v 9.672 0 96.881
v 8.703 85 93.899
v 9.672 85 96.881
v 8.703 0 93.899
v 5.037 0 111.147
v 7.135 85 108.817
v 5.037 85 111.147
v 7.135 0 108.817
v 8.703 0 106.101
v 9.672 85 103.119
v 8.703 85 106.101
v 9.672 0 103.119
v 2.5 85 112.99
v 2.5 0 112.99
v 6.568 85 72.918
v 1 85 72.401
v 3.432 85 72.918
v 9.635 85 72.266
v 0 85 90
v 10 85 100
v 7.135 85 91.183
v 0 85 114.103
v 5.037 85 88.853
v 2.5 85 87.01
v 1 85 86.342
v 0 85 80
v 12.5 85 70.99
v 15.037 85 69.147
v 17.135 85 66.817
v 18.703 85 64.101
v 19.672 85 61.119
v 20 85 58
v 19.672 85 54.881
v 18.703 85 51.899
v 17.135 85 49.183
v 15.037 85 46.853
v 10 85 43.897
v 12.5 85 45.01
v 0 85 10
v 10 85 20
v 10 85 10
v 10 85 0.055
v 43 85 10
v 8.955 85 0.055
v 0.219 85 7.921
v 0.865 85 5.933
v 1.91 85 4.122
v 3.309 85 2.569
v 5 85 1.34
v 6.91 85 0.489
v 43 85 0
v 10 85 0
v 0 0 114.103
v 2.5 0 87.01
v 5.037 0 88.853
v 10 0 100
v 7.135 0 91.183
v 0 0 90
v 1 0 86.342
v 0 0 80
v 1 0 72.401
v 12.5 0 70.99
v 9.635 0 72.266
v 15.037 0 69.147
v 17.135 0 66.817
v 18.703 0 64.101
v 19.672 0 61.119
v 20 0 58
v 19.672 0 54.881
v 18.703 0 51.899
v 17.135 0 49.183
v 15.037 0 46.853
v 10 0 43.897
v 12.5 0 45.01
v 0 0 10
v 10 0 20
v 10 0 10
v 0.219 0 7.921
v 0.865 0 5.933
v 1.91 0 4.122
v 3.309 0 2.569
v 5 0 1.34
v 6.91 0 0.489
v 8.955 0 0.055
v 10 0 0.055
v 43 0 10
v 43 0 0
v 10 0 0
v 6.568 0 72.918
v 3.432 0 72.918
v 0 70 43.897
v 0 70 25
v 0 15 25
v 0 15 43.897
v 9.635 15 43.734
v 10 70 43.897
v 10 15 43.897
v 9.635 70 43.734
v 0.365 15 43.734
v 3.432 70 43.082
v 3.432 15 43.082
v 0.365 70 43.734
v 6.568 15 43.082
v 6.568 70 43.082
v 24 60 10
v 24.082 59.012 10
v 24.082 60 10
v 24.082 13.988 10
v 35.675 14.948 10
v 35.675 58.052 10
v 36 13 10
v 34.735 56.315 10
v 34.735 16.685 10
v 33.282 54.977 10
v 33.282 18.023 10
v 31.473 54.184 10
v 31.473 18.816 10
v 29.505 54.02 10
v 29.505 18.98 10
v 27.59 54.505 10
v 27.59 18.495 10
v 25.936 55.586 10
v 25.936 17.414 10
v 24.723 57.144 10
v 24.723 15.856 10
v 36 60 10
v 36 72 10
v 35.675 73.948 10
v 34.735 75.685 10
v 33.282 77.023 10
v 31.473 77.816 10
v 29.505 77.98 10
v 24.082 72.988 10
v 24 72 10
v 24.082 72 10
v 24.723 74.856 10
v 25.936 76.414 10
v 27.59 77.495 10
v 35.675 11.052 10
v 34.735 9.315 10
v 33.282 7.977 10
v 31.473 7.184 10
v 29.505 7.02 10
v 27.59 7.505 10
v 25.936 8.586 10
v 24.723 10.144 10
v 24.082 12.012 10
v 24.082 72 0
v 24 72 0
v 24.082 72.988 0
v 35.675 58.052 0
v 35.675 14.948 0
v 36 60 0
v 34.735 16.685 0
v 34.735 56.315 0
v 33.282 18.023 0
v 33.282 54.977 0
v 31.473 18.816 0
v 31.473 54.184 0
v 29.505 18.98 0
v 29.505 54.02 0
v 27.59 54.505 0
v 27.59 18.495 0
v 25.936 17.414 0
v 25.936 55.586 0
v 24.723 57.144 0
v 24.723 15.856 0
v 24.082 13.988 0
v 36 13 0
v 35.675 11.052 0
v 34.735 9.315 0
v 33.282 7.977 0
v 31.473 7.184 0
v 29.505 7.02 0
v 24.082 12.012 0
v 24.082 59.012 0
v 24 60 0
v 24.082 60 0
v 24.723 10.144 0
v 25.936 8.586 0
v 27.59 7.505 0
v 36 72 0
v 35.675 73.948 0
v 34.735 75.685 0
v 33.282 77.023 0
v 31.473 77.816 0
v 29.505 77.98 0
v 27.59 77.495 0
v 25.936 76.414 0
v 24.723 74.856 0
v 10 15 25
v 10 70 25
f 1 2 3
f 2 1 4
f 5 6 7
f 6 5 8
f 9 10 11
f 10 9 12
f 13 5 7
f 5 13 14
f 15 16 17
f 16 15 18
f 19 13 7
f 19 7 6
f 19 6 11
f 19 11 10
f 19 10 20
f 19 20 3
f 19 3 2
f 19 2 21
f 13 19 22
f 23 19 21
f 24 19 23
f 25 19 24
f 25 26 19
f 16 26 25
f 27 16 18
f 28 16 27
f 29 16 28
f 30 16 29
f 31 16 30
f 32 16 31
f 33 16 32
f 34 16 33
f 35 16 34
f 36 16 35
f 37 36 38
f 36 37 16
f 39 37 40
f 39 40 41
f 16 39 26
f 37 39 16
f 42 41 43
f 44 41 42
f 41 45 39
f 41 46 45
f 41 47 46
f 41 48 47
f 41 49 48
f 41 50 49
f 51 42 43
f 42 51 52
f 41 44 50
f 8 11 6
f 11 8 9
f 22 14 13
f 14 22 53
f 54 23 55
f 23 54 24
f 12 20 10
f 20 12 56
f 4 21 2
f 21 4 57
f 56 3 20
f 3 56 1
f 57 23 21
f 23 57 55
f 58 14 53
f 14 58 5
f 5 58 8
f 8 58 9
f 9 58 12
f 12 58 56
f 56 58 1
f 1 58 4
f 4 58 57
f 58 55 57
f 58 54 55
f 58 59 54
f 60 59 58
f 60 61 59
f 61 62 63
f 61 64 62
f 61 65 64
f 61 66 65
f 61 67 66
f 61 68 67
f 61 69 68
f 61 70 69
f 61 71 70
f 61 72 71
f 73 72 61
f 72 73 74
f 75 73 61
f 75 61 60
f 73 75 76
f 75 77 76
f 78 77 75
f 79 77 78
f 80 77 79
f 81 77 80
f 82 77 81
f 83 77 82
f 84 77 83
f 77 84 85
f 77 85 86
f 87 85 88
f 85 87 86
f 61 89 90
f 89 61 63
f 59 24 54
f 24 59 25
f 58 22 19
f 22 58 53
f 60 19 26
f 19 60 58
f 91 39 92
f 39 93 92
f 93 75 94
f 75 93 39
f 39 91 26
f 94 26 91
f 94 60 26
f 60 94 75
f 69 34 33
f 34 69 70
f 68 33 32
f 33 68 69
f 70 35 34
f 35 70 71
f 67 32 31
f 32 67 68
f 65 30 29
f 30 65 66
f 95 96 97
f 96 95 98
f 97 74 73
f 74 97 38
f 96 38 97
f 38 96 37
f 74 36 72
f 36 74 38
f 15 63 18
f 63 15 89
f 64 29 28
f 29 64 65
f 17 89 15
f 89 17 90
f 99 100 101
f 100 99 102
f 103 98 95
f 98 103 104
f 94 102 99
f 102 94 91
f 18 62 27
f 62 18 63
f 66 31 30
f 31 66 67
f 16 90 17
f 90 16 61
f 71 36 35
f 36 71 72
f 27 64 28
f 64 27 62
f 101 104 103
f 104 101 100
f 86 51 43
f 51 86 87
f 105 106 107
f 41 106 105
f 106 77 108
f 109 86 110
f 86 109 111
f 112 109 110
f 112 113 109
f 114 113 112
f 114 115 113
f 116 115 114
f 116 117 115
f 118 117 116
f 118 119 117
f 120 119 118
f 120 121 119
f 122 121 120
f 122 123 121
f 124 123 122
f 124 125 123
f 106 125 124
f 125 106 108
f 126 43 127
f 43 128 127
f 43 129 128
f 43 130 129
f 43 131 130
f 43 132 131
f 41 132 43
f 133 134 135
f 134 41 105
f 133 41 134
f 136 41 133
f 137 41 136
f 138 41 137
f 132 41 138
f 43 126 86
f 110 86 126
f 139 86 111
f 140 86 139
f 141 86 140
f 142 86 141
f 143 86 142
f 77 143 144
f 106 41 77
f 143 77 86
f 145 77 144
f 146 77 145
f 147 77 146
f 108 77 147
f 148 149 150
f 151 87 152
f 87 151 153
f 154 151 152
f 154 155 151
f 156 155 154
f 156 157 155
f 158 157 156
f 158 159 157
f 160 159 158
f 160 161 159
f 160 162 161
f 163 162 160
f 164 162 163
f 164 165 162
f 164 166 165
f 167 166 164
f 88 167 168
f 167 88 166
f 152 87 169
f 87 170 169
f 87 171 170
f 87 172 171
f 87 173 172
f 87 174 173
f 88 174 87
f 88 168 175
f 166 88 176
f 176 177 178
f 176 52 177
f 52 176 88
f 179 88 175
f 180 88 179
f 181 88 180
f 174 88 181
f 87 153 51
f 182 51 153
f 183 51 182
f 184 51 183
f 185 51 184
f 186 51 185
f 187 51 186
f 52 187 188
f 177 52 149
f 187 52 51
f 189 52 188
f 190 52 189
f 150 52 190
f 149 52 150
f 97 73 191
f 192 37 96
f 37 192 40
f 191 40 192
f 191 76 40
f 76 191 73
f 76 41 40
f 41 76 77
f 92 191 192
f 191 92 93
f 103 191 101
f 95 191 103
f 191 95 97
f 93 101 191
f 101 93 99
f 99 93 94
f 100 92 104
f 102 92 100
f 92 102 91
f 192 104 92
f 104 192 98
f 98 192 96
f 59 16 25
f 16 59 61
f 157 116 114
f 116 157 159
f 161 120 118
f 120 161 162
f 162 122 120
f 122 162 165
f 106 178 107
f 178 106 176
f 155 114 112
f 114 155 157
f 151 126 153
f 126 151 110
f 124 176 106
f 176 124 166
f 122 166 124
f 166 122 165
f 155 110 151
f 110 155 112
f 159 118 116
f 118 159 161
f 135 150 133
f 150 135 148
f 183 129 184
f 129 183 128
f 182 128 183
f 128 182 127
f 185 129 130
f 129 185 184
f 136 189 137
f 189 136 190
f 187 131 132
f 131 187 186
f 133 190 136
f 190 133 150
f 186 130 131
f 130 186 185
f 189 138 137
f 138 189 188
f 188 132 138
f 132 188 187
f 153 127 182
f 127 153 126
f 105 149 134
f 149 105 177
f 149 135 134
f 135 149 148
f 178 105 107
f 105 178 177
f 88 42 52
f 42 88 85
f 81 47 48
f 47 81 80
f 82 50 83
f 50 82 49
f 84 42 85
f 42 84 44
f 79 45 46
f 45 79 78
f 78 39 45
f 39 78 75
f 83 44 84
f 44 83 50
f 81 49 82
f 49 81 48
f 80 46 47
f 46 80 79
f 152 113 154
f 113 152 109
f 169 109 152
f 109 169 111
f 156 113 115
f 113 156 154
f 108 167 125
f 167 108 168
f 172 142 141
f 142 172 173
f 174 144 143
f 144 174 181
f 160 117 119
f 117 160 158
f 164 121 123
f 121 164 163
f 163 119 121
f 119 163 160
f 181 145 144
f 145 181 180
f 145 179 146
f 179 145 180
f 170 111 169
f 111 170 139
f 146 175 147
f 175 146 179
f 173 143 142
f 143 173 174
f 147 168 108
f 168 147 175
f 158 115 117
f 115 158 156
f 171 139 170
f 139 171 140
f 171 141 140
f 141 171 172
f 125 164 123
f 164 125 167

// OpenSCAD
difference(){
	union(){
		cube([43,85,10]);
		cube([10,85,25]);
		translate ([0,0,20]) cube([10,15,30]);
		translate ([0,70,20]) cube([10,15,30]);
		translate ([0,0,70]) cube ([1,85,20]);
		rotate(a = [-90,0,0]) {
			translate ([5,-58,0]) cylinder(h = 85, r = 15);
			translate([0,-200,0]){
				rotate ([0,0,180]){
					translate ([5,-100,0]) {
						difference() {
							cylinder(h = 85, r = 15);
							translate([-5,-20,-5]) cube ([25,40,105]);
						}
					}
				}
			}
		}

	}
	rotate(a = [-90,0,0]){
		translate ([20,-20,-1]) cylinder(h = 87, r = 10);
	}
	translate([30, 13, -1]) cylinder(r=6, h= 80);
	translate([30, 60, -1]) union(){
		cylinder(r=6, h= 80);
		translate([0, 12, 0]) cylinder(r=6, h= 80);
		translate([-6,0,0]) cube([12,12,80]);
	}
	translate ([-20,-5,-5]) cube ([20,95,85]);
	translate ([0,-5,0]) {
		difference() {
			translate ([-2,0,-2]) cube ([12,95,12]);
			rotate(a = [-90,0,0]) {	
				translate ([10,-10,-1]) cylinder(h = 105, r = 10);
			}
		}
	}
}
